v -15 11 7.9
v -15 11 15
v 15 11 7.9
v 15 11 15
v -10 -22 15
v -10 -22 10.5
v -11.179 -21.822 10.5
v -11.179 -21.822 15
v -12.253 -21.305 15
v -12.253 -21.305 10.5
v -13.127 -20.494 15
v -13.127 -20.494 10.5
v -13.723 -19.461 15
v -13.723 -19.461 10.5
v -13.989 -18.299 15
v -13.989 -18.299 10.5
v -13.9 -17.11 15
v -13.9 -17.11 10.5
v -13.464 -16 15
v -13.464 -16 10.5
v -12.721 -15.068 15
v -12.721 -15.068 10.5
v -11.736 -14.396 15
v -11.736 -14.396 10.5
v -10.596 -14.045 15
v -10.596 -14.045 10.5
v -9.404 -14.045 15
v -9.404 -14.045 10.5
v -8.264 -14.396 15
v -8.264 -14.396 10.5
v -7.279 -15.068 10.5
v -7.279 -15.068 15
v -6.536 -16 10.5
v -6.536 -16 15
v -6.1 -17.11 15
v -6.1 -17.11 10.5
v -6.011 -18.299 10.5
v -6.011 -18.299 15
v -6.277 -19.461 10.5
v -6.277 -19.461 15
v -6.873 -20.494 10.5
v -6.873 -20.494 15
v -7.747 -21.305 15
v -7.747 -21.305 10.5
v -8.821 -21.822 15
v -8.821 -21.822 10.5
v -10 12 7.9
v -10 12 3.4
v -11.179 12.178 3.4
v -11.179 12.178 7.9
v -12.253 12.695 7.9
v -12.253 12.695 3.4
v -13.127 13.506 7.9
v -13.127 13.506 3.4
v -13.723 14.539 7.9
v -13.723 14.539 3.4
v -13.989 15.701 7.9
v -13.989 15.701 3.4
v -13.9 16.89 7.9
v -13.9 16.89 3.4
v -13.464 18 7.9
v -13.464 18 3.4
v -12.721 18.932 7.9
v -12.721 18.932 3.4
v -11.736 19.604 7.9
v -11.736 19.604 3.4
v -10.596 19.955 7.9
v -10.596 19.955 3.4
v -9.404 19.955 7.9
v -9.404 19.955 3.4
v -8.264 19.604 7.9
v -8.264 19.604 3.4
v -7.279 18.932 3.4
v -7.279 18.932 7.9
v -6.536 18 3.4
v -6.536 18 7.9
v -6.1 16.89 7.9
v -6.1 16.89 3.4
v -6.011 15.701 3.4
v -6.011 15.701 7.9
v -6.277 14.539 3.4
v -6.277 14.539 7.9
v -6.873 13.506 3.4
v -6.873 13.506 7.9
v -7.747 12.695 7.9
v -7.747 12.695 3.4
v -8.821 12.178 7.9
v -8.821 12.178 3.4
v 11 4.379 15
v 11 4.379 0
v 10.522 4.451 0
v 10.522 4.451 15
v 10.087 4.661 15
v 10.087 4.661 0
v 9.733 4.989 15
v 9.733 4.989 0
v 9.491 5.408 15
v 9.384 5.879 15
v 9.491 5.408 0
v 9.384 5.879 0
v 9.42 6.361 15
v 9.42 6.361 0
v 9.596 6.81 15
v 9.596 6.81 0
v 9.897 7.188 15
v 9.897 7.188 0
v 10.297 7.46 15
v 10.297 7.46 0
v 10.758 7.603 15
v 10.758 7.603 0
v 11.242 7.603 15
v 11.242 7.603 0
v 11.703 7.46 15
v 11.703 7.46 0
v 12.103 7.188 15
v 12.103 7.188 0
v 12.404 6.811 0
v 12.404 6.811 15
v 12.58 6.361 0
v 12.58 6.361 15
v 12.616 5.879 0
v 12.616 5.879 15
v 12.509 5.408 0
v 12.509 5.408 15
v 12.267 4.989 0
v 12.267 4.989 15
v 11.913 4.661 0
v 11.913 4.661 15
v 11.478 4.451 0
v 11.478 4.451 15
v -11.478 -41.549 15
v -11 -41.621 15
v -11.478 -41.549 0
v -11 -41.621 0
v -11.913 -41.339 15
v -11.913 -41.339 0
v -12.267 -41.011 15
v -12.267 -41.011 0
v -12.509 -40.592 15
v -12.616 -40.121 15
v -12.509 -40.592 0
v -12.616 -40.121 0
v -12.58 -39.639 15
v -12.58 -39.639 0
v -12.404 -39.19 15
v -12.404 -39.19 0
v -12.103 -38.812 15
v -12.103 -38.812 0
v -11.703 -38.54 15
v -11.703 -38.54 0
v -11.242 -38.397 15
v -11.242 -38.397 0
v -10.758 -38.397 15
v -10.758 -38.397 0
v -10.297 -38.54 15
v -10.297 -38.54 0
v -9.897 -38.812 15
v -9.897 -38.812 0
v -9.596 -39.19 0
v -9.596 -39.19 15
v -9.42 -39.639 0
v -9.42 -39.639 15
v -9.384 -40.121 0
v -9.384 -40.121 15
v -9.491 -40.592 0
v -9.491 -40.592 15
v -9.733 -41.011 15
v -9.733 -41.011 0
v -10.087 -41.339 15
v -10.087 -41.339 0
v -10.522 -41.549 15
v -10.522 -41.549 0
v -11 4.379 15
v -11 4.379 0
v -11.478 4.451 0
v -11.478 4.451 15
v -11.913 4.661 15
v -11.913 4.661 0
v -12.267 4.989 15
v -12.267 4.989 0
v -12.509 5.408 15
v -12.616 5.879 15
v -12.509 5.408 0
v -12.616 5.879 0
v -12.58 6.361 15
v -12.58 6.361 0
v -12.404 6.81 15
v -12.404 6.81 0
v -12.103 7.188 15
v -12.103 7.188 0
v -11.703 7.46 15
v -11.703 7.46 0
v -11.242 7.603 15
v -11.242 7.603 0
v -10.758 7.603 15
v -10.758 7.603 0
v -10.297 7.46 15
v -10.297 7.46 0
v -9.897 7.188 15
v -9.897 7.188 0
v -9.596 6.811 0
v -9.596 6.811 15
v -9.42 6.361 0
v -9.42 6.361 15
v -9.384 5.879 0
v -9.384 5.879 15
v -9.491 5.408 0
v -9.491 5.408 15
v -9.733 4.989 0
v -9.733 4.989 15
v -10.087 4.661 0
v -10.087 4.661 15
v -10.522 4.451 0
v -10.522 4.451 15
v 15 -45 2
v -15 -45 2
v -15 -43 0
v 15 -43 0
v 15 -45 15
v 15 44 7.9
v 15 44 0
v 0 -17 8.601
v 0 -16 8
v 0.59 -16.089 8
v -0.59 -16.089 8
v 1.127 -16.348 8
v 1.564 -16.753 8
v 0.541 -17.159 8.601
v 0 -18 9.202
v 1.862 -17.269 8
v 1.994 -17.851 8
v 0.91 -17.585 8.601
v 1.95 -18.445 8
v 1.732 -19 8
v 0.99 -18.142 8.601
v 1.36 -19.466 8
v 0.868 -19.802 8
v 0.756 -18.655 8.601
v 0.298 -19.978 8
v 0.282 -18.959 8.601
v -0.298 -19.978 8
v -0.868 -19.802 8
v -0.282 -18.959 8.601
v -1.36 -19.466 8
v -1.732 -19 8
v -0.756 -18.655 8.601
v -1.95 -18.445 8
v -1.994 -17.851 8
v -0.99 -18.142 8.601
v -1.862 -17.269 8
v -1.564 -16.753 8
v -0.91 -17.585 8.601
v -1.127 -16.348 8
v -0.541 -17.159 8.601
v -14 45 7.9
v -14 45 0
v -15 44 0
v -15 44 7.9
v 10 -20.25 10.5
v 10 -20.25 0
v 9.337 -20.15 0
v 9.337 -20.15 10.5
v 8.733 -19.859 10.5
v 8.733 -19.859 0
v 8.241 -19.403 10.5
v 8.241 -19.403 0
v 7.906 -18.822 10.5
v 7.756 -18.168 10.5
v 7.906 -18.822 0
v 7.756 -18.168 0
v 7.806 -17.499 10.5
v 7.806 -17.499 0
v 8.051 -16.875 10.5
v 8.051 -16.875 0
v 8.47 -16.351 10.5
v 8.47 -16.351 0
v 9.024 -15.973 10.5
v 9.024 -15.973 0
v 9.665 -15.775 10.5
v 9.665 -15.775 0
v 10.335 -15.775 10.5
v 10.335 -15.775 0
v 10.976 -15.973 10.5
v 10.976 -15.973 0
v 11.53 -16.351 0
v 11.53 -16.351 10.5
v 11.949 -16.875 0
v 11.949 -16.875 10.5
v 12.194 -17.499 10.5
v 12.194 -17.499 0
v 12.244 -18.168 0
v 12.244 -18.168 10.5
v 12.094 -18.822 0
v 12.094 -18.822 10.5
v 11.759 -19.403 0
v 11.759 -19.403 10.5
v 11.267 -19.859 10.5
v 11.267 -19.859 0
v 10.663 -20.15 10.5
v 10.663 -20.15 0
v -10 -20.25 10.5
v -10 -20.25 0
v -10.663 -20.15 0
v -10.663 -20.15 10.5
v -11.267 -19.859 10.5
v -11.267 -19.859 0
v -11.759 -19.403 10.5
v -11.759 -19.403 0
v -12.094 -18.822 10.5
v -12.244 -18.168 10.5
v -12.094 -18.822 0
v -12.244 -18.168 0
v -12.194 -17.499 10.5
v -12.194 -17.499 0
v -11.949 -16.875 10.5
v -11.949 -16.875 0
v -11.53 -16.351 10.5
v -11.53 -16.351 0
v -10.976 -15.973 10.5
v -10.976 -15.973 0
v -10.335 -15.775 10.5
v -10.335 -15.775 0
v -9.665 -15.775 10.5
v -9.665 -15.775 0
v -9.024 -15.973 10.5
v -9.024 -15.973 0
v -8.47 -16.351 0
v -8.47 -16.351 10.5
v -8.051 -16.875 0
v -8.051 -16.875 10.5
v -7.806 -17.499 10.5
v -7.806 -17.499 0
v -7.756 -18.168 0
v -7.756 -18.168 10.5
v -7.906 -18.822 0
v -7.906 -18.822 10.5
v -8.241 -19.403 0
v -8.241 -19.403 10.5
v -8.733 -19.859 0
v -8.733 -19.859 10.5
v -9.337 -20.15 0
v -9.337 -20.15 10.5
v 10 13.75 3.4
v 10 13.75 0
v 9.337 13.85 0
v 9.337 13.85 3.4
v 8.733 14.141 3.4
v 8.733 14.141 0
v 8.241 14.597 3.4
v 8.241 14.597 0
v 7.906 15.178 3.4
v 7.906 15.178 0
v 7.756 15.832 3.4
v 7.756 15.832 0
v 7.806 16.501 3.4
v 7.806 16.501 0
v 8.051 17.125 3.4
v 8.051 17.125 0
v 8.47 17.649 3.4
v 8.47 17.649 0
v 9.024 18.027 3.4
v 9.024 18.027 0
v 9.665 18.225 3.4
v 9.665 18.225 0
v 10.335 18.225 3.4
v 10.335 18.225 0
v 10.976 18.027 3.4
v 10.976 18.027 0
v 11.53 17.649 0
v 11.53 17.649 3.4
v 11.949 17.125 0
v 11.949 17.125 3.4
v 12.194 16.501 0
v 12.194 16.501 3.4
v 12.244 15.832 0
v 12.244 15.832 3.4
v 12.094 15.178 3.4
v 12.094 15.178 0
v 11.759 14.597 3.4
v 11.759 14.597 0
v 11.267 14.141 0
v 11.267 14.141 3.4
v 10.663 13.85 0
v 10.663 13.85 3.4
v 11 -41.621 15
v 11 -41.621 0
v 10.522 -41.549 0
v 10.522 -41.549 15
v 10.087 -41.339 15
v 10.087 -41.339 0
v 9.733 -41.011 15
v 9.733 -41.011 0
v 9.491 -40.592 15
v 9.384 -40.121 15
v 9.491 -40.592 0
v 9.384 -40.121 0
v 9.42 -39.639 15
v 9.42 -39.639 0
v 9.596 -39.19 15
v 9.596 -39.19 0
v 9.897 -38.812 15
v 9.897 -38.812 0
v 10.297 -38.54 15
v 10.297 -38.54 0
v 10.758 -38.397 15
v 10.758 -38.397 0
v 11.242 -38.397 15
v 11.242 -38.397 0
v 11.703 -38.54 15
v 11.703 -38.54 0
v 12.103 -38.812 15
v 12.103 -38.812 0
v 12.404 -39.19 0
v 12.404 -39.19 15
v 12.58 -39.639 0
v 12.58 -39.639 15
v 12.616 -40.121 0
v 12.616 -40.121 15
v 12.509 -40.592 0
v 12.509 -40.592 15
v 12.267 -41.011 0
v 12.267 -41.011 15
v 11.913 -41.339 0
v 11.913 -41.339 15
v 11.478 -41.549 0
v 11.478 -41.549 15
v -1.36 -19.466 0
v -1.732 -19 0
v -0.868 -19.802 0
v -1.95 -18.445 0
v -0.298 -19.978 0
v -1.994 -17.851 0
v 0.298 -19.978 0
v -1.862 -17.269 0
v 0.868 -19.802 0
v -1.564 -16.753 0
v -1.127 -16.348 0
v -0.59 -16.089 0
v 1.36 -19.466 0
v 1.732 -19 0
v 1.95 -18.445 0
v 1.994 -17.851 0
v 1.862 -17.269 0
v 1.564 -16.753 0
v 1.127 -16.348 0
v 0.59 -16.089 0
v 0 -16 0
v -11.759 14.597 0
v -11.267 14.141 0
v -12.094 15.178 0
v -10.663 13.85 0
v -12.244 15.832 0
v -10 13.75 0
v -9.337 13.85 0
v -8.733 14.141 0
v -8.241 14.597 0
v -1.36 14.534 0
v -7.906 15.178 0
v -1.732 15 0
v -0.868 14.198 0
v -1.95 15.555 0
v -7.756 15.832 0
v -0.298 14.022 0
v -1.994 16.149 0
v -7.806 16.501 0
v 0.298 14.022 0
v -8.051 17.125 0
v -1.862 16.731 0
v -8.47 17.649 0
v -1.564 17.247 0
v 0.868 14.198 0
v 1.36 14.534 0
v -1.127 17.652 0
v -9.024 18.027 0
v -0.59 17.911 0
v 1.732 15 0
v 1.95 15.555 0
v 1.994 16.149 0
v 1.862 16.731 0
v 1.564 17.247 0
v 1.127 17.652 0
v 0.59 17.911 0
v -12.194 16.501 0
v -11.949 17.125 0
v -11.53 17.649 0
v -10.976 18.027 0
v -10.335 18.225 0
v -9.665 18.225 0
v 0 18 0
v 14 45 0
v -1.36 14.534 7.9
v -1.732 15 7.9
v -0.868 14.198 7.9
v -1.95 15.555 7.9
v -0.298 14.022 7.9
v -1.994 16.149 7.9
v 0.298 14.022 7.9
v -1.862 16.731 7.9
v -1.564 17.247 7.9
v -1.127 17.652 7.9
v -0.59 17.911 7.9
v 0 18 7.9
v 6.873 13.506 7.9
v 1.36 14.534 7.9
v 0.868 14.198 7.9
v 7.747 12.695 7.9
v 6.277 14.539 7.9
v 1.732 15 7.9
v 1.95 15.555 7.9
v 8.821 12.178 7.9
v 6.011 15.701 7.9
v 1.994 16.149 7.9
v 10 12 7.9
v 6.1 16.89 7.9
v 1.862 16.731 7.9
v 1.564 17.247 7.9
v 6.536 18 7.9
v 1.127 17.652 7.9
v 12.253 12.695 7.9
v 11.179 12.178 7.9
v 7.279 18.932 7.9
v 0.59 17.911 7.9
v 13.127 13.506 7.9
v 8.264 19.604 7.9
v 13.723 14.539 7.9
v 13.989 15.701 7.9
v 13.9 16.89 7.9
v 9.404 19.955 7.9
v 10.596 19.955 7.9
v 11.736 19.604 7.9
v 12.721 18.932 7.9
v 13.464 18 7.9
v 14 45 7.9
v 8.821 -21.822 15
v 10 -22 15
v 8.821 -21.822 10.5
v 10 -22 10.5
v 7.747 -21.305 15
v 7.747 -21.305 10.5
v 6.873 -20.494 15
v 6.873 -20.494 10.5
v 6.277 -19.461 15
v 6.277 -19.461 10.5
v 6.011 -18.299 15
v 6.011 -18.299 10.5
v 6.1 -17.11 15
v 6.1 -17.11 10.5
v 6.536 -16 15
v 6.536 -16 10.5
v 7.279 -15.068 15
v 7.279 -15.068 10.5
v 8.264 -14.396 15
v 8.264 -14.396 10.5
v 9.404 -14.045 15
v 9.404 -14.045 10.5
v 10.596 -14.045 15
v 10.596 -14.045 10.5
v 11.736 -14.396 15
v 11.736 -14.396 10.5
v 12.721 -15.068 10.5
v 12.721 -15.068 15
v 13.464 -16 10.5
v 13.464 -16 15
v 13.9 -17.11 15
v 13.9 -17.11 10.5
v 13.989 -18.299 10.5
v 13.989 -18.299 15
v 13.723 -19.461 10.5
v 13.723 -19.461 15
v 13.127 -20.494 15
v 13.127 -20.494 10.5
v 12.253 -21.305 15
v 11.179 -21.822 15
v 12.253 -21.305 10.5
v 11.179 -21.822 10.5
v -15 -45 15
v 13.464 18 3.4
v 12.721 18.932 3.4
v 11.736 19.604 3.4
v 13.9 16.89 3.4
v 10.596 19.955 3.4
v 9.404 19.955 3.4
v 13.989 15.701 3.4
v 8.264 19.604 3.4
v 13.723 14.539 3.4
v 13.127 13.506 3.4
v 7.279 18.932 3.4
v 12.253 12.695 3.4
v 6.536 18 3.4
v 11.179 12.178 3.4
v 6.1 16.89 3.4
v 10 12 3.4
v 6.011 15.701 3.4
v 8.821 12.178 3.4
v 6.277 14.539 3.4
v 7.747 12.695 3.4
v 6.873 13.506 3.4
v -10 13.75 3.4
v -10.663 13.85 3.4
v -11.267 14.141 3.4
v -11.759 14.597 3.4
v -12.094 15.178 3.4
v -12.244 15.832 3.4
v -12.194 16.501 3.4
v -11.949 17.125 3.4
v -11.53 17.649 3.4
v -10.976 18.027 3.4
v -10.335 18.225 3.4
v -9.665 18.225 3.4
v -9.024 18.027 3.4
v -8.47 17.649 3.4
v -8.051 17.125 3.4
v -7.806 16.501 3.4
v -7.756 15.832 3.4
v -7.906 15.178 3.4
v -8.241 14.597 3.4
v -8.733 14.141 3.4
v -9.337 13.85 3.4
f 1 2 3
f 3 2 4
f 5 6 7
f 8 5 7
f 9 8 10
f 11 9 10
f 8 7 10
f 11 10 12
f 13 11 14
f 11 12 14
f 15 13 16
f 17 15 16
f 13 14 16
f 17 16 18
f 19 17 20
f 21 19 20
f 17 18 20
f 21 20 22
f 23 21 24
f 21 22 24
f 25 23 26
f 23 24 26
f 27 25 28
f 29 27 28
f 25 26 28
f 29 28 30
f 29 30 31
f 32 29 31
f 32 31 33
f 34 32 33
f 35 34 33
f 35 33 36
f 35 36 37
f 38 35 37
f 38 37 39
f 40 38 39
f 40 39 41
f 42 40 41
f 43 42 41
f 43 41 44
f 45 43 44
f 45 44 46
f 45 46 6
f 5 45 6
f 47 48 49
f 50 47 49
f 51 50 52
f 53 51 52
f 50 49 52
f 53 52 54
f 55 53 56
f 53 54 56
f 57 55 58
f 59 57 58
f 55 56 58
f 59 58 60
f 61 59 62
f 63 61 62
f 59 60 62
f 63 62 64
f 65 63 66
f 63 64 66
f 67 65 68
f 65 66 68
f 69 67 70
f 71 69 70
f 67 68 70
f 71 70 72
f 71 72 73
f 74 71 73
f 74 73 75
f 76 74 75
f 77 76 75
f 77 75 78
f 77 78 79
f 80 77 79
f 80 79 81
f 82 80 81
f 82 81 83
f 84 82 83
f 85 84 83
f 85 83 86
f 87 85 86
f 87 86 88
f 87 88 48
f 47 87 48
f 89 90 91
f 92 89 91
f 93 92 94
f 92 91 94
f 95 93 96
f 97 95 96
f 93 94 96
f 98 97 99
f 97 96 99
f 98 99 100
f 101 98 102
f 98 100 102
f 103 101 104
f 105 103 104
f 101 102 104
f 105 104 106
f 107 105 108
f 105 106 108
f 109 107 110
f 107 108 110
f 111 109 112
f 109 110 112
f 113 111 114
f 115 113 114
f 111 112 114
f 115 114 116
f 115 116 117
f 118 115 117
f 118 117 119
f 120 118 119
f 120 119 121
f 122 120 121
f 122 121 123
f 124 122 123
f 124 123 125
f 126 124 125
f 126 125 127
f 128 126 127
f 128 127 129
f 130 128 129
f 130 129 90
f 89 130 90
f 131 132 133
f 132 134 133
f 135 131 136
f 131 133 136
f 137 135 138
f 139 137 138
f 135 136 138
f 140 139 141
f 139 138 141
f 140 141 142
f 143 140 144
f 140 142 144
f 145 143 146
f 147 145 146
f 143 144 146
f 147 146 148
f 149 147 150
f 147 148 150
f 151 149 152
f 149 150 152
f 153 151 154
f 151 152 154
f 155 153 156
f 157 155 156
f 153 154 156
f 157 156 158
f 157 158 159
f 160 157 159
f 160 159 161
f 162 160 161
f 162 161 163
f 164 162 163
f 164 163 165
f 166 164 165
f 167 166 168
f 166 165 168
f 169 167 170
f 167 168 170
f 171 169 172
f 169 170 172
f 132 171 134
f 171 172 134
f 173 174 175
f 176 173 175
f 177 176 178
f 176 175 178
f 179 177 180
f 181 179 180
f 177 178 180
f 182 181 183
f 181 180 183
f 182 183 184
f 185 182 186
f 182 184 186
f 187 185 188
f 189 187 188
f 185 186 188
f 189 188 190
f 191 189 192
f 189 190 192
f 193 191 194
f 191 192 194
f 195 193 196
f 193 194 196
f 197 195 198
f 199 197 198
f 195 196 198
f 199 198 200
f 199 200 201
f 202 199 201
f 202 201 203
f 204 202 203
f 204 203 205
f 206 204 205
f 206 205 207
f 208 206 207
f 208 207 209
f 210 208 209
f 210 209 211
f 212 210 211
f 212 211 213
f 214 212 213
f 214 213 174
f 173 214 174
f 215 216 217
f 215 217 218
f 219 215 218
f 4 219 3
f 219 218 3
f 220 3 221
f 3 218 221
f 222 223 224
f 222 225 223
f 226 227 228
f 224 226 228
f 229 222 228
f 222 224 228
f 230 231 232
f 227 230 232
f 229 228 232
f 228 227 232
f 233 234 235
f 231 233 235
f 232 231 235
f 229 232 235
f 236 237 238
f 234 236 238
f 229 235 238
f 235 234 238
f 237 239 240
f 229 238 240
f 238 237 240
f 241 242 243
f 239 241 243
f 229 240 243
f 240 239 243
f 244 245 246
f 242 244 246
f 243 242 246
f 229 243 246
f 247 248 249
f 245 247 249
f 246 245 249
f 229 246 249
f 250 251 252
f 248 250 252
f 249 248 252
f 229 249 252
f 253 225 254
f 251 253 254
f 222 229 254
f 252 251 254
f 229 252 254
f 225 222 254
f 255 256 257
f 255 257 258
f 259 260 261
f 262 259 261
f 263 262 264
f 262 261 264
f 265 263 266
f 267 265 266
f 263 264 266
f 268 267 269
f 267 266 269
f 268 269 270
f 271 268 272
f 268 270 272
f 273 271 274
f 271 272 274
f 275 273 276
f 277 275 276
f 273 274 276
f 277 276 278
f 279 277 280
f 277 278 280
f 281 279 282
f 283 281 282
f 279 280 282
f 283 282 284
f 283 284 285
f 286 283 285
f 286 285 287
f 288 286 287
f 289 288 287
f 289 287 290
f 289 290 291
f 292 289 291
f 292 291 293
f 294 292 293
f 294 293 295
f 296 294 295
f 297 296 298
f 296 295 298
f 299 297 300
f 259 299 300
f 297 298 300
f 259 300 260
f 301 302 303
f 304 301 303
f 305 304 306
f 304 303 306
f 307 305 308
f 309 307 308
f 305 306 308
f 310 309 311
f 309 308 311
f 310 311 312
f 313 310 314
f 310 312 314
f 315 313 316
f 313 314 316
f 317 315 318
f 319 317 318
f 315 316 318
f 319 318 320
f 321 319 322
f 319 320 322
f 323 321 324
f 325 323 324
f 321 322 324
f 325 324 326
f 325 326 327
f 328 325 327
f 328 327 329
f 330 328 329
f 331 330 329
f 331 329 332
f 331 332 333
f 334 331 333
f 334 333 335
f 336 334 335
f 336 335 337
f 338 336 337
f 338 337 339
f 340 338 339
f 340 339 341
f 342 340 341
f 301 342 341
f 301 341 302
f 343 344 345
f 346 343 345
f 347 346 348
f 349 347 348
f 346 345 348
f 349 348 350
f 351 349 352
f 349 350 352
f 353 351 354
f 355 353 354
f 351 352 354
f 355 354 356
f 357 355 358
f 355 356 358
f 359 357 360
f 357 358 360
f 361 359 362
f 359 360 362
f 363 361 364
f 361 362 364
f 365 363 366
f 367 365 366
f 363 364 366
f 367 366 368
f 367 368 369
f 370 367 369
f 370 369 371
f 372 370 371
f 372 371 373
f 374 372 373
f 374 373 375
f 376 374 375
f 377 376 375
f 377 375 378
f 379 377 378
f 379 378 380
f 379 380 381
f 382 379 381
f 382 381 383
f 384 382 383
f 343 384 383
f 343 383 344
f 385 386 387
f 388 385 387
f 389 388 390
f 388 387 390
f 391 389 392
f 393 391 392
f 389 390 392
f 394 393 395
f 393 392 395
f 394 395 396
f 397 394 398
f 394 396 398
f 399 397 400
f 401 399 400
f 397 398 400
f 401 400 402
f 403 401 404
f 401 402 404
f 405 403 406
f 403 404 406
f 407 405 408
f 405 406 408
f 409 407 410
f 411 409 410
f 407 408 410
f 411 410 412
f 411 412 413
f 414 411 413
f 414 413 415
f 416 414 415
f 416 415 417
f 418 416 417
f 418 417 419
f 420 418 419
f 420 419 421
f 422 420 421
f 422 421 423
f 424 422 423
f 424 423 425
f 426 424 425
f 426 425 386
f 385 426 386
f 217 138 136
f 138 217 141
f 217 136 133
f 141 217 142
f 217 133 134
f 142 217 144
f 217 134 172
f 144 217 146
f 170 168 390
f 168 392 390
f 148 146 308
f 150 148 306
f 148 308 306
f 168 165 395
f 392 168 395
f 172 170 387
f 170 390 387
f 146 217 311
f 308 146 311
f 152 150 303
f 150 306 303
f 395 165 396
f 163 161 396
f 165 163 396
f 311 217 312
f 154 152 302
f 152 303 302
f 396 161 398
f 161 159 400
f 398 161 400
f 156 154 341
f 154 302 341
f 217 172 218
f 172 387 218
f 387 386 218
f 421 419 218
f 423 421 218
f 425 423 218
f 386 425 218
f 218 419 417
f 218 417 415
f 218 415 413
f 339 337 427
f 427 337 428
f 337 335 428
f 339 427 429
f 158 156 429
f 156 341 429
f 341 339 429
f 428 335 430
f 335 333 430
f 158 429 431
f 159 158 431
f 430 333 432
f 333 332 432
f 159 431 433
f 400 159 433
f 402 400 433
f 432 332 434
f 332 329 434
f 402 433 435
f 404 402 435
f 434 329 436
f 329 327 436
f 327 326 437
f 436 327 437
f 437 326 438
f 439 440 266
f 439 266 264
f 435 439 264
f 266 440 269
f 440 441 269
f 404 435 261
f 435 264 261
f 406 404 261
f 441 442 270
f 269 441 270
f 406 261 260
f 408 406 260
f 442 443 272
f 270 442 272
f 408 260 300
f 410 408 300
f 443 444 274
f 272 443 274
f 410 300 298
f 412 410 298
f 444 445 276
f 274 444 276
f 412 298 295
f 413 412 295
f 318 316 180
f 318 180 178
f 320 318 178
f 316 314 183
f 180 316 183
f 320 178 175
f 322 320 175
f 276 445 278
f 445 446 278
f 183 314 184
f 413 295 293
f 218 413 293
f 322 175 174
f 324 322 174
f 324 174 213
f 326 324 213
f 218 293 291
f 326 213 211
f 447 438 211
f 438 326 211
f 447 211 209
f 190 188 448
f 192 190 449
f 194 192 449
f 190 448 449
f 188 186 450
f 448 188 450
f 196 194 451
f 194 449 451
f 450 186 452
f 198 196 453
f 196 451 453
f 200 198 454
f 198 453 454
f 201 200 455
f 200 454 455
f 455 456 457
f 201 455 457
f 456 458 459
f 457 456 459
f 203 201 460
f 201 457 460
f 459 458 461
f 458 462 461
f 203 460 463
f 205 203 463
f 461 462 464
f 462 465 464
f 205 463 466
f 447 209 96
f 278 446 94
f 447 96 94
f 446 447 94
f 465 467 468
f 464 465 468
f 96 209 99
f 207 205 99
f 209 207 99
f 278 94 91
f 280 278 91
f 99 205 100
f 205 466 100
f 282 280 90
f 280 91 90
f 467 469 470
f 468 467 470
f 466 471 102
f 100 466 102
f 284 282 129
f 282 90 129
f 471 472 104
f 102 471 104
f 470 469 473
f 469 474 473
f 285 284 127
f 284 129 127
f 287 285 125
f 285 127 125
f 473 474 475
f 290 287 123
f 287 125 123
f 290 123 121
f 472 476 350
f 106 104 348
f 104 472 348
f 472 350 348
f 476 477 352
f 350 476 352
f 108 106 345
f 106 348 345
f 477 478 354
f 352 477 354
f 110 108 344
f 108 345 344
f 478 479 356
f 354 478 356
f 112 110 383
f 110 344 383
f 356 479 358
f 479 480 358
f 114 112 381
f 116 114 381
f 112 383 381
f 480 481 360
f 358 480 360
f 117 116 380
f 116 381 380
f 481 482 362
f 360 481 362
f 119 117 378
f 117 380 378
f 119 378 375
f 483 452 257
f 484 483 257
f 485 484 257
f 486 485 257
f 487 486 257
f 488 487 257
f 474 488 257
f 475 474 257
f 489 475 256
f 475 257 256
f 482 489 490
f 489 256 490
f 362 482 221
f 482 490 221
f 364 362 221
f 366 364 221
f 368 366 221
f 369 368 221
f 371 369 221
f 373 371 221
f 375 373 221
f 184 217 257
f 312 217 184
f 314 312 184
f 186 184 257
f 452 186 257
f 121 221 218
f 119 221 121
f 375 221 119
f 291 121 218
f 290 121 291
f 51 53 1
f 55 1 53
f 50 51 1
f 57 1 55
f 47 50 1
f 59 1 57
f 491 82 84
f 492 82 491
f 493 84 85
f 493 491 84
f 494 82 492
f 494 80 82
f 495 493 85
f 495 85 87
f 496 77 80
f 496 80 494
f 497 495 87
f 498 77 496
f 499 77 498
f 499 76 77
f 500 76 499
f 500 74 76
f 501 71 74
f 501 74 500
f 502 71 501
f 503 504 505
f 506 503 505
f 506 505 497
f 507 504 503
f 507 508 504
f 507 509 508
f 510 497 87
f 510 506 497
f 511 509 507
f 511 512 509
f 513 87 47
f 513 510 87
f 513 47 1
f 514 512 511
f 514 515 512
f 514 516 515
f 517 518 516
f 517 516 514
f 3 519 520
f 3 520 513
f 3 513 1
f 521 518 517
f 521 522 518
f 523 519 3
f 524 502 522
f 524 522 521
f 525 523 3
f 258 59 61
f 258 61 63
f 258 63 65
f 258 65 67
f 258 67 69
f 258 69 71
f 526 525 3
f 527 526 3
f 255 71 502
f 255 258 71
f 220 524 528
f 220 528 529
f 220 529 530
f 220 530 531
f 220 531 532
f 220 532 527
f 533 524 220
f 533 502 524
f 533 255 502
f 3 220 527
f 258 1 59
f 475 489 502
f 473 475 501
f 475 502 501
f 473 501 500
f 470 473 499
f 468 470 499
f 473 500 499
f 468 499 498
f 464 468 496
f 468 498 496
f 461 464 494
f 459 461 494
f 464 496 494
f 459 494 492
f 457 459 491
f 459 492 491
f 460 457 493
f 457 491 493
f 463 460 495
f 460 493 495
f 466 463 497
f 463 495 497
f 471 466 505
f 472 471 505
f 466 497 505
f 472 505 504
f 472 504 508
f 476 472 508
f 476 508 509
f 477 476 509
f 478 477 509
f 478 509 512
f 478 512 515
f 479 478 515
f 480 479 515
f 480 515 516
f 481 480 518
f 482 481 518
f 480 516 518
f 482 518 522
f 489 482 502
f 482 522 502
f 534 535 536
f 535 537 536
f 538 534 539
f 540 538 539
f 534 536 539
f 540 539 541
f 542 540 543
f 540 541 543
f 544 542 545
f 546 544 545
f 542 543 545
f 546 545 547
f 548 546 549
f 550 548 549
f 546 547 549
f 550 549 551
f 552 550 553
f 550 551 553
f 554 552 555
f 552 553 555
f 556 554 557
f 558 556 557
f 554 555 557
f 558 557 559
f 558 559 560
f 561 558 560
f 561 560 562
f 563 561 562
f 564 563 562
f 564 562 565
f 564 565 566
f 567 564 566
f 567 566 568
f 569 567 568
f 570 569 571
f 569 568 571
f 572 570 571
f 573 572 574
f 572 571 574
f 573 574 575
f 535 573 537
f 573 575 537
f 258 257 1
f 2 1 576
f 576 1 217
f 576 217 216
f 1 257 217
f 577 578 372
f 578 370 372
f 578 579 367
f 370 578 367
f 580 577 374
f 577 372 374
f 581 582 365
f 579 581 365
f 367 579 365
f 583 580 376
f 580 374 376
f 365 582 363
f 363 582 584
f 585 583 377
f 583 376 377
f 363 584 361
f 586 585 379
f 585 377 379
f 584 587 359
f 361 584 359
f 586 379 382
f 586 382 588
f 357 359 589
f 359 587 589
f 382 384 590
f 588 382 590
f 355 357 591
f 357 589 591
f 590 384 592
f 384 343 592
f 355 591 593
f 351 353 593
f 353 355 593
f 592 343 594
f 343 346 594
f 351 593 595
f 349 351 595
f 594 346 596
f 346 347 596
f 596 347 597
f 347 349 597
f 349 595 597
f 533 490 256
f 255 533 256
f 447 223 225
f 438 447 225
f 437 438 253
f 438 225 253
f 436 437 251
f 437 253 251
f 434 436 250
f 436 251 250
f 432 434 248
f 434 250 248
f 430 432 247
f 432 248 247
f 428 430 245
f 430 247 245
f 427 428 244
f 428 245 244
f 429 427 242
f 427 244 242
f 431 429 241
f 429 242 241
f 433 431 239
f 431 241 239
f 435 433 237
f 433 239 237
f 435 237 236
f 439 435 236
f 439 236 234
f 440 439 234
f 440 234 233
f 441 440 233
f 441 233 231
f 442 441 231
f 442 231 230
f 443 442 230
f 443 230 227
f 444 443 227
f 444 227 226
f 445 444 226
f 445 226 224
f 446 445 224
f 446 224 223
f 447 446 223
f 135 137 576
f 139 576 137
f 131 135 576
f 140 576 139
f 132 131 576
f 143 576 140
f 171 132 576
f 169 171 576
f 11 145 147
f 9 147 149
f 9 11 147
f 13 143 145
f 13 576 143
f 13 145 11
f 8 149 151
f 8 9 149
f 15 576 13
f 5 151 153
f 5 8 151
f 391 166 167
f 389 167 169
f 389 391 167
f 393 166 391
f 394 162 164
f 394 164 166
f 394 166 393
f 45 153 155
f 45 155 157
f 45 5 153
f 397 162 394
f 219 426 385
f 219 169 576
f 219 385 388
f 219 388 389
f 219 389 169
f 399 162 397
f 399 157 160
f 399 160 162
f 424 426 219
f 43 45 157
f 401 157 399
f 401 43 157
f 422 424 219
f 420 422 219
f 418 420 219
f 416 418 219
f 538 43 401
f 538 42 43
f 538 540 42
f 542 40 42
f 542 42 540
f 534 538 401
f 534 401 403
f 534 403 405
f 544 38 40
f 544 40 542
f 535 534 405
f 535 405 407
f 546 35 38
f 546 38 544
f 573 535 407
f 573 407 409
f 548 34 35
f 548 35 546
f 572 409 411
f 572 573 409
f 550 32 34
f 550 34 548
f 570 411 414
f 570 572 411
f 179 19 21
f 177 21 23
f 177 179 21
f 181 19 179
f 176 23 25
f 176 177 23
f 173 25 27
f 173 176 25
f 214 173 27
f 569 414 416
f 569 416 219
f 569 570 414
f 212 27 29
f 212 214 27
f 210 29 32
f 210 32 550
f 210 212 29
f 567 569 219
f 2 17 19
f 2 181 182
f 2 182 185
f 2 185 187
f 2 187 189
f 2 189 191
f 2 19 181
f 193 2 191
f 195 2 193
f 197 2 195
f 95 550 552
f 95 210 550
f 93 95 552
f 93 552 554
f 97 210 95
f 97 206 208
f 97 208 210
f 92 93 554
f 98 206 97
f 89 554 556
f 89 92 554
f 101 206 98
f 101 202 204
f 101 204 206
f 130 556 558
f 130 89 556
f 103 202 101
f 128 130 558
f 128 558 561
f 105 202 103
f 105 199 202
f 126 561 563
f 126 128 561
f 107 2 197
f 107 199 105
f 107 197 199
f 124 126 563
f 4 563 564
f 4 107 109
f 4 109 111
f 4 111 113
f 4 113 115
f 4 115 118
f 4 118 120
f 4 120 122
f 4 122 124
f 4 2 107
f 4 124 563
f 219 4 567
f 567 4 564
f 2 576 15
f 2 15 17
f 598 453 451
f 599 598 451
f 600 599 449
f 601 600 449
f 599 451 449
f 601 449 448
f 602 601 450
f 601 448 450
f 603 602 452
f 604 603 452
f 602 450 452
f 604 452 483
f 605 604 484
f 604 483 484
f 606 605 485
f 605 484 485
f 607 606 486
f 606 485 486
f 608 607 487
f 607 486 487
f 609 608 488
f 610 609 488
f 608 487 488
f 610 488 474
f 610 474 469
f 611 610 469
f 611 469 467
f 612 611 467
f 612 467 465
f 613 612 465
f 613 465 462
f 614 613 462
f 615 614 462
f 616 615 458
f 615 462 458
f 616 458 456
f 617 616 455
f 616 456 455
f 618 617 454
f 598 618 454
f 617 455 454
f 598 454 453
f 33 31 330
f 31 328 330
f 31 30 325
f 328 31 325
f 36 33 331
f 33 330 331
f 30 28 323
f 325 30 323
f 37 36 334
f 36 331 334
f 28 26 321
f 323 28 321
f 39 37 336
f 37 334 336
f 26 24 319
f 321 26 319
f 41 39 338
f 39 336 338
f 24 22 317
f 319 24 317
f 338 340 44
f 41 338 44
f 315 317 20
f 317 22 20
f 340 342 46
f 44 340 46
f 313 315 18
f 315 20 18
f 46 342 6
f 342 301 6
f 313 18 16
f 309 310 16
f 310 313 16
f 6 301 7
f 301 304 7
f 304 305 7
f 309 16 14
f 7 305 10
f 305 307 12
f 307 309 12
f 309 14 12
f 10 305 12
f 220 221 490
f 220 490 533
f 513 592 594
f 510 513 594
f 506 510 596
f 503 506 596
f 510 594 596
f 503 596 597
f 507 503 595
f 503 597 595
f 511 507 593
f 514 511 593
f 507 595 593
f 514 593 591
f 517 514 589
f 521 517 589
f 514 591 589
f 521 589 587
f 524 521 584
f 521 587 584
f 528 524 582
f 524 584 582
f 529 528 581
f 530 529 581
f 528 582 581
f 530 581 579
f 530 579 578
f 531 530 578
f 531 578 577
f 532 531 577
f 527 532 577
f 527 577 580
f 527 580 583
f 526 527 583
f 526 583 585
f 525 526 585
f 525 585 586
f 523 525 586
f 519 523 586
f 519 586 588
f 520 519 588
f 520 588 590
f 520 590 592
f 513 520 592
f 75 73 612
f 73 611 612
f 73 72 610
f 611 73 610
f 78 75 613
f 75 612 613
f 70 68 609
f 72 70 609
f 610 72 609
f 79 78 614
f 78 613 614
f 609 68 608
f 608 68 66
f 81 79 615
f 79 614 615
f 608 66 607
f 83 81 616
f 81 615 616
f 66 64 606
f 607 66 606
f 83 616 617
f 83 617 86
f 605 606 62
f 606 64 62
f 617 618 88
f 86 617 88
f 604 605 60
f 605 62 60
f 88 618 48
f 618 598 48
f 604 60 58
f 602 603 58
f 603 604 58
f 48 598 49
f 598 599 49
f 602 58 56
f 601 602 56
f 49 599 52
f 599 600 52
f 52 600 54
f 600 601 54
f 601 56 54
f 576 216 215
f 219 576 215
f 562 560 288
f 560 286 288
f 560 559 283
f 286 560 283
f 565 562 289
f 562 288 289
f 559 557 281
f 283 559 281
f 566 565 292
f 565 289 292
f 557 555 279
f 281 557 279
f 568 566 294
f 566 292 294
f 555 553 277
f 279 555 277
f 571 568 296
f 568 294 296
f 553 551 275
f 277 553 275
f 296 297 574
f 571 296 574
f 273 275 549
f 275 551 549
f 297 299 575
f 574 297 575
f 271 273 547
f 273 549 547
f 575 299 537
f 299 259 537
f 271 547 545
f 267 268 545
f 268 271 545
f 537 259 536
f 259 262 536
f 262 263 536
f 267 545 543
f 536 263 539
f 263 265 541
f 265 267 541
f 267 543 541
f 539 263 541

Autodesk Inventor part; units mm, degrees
ref_plane "YZ Plane" through (0, 0, 0) normal (1, 0, 0) x (0, 1, 0)
ref_plane "XZ Plane" through (0, 0, 0) normal (0, 1, 0) x (-1, 0, 0)
ref_plane "XY Plane" through (0, 0, 0) normal (0, 0, 1) x (1, 0, 0)
sketch "スケッチ1" plane through (0, 0, 0) normal (0, 0, 1) x (1, 0, 0)
  line L0 (-15, -45) -> (15, -45)
  line L1 (15, -45) -> (15, 45)
  line L2 (15, 45) -> (-15, 45)
  line L3 (-15, 45) -> (-15, -45)
  point P0 (0, 0)
  point P1 (0, -45)
  point P2 (-15, 0)
  dimension "d0" = 30
  dimension "d1" = 90
extrude "押し出し1" add sketch "スケッチ1" along normal blind 15
sketch "スケッチ6" plane through (0, 0, 15) normal (0, 0, 1) x (1, 0, 0)
  line L0 (15, -45) -> (-15, -45) projected
  point P0 (0, 0)
  point P1 (-11, -40)
  dimension "d33" = 11
  dimension "d52" = 5
hole "穴3" at (-11, -40, 15) direction (0, 0, -1) diameter 3.242 end through all thread size "M4x0.7" class "6H" standard "ANSI Metric M Profile"
pattern_linear "矩形状パターン2" count 2 spacing 22 along (1, 0, 0) count 2 spacing 46 along (0, 1, 0) of "穴3"
sketch "スケッチ9" plane through (0, 0, 15) normal (0, 0, 1) x (1, 0, 0)
  line L0 (15, -45) -> (-15, -45) projected
  point P0 (0, 0)
  point P1 (-10, -18)
  point P2 (10, -18)
  dimension "d53" = 27
  dimension "d54" = 10
  dimension "d62" = 10
hole "穴4" at (-10, -18, 15) at (10, -18, 15) direction (0, 0, -1) diameter 4.5 end through all counterbore diameter 8 counterbore depth 4.5
sketch "スケッチ10" plane through (0, 0, 15) normal (0, 0, 1) x (1, 0, 0)
  circle A0 centre (-11, 6) radius 1.621 projected
  line L0 (-15, -45) -> (-15, 45) projected
  line L1 (15, 45) -> (15, -45) projected
  line L2 (-15, 45) -> (15, 45) projected
  line L3 (-15, 11) -> (15, 11)
  point P0 (0, 0)
  dimension "d63" = 5
extrude "押し出し5" cut sketch "スケッチ10" against normal blind 7.1 contours L0 L2 L1 L3
sketch "スケッチ11" plane through (0, 0, 7.9) normal (0, 0, 1) x (1, 0, 0)
  circle A0 centre (-10, -18) radius 4 projected
  circle A1 centre (10, -18) radius 4 projected
  point P0 (0, 0)
  point P1 (-10, 16)
  point P2 (10, 16)
  dimension "d66" = 34
hole "穴5" at (-10, 16, 7.9) at (10, 16, 7.9) direction (0, 0, -1) diameter 4.5 end through all counterbore diameter 8 counterbore depth 4.5
chamfer "面取り1" distance 1 angle 45 2 edges at (15, 45, 3.95) (-15, 45, 3.95)
sketch "スケッチ12" plane through (0, 0, 0) normal (0, 0, -1) x (-1, 0, 0)
  line L0 (15, -45) -> (-15, -45) projected
  circle A0 centre (-10, 16) radius 2.25 projected
  circle A1 centre (-10, -18) radius 2.25 projected
  point P0 (0, 0)
  point P1 (0, 16)
  point P2 (0, -18)
  point P3 (0, -45)
hole "穴6" at (0, 16, 0) at (0, -18, 0) direction (0, 0, 1) diameter 4 depth 8 tip angle 118
chamfer "面取り2" distance 2 angle 45 1 edges at (0, -45, 0)
equation "\"d62\" = d54"
properties part number "04" material "A5052"
